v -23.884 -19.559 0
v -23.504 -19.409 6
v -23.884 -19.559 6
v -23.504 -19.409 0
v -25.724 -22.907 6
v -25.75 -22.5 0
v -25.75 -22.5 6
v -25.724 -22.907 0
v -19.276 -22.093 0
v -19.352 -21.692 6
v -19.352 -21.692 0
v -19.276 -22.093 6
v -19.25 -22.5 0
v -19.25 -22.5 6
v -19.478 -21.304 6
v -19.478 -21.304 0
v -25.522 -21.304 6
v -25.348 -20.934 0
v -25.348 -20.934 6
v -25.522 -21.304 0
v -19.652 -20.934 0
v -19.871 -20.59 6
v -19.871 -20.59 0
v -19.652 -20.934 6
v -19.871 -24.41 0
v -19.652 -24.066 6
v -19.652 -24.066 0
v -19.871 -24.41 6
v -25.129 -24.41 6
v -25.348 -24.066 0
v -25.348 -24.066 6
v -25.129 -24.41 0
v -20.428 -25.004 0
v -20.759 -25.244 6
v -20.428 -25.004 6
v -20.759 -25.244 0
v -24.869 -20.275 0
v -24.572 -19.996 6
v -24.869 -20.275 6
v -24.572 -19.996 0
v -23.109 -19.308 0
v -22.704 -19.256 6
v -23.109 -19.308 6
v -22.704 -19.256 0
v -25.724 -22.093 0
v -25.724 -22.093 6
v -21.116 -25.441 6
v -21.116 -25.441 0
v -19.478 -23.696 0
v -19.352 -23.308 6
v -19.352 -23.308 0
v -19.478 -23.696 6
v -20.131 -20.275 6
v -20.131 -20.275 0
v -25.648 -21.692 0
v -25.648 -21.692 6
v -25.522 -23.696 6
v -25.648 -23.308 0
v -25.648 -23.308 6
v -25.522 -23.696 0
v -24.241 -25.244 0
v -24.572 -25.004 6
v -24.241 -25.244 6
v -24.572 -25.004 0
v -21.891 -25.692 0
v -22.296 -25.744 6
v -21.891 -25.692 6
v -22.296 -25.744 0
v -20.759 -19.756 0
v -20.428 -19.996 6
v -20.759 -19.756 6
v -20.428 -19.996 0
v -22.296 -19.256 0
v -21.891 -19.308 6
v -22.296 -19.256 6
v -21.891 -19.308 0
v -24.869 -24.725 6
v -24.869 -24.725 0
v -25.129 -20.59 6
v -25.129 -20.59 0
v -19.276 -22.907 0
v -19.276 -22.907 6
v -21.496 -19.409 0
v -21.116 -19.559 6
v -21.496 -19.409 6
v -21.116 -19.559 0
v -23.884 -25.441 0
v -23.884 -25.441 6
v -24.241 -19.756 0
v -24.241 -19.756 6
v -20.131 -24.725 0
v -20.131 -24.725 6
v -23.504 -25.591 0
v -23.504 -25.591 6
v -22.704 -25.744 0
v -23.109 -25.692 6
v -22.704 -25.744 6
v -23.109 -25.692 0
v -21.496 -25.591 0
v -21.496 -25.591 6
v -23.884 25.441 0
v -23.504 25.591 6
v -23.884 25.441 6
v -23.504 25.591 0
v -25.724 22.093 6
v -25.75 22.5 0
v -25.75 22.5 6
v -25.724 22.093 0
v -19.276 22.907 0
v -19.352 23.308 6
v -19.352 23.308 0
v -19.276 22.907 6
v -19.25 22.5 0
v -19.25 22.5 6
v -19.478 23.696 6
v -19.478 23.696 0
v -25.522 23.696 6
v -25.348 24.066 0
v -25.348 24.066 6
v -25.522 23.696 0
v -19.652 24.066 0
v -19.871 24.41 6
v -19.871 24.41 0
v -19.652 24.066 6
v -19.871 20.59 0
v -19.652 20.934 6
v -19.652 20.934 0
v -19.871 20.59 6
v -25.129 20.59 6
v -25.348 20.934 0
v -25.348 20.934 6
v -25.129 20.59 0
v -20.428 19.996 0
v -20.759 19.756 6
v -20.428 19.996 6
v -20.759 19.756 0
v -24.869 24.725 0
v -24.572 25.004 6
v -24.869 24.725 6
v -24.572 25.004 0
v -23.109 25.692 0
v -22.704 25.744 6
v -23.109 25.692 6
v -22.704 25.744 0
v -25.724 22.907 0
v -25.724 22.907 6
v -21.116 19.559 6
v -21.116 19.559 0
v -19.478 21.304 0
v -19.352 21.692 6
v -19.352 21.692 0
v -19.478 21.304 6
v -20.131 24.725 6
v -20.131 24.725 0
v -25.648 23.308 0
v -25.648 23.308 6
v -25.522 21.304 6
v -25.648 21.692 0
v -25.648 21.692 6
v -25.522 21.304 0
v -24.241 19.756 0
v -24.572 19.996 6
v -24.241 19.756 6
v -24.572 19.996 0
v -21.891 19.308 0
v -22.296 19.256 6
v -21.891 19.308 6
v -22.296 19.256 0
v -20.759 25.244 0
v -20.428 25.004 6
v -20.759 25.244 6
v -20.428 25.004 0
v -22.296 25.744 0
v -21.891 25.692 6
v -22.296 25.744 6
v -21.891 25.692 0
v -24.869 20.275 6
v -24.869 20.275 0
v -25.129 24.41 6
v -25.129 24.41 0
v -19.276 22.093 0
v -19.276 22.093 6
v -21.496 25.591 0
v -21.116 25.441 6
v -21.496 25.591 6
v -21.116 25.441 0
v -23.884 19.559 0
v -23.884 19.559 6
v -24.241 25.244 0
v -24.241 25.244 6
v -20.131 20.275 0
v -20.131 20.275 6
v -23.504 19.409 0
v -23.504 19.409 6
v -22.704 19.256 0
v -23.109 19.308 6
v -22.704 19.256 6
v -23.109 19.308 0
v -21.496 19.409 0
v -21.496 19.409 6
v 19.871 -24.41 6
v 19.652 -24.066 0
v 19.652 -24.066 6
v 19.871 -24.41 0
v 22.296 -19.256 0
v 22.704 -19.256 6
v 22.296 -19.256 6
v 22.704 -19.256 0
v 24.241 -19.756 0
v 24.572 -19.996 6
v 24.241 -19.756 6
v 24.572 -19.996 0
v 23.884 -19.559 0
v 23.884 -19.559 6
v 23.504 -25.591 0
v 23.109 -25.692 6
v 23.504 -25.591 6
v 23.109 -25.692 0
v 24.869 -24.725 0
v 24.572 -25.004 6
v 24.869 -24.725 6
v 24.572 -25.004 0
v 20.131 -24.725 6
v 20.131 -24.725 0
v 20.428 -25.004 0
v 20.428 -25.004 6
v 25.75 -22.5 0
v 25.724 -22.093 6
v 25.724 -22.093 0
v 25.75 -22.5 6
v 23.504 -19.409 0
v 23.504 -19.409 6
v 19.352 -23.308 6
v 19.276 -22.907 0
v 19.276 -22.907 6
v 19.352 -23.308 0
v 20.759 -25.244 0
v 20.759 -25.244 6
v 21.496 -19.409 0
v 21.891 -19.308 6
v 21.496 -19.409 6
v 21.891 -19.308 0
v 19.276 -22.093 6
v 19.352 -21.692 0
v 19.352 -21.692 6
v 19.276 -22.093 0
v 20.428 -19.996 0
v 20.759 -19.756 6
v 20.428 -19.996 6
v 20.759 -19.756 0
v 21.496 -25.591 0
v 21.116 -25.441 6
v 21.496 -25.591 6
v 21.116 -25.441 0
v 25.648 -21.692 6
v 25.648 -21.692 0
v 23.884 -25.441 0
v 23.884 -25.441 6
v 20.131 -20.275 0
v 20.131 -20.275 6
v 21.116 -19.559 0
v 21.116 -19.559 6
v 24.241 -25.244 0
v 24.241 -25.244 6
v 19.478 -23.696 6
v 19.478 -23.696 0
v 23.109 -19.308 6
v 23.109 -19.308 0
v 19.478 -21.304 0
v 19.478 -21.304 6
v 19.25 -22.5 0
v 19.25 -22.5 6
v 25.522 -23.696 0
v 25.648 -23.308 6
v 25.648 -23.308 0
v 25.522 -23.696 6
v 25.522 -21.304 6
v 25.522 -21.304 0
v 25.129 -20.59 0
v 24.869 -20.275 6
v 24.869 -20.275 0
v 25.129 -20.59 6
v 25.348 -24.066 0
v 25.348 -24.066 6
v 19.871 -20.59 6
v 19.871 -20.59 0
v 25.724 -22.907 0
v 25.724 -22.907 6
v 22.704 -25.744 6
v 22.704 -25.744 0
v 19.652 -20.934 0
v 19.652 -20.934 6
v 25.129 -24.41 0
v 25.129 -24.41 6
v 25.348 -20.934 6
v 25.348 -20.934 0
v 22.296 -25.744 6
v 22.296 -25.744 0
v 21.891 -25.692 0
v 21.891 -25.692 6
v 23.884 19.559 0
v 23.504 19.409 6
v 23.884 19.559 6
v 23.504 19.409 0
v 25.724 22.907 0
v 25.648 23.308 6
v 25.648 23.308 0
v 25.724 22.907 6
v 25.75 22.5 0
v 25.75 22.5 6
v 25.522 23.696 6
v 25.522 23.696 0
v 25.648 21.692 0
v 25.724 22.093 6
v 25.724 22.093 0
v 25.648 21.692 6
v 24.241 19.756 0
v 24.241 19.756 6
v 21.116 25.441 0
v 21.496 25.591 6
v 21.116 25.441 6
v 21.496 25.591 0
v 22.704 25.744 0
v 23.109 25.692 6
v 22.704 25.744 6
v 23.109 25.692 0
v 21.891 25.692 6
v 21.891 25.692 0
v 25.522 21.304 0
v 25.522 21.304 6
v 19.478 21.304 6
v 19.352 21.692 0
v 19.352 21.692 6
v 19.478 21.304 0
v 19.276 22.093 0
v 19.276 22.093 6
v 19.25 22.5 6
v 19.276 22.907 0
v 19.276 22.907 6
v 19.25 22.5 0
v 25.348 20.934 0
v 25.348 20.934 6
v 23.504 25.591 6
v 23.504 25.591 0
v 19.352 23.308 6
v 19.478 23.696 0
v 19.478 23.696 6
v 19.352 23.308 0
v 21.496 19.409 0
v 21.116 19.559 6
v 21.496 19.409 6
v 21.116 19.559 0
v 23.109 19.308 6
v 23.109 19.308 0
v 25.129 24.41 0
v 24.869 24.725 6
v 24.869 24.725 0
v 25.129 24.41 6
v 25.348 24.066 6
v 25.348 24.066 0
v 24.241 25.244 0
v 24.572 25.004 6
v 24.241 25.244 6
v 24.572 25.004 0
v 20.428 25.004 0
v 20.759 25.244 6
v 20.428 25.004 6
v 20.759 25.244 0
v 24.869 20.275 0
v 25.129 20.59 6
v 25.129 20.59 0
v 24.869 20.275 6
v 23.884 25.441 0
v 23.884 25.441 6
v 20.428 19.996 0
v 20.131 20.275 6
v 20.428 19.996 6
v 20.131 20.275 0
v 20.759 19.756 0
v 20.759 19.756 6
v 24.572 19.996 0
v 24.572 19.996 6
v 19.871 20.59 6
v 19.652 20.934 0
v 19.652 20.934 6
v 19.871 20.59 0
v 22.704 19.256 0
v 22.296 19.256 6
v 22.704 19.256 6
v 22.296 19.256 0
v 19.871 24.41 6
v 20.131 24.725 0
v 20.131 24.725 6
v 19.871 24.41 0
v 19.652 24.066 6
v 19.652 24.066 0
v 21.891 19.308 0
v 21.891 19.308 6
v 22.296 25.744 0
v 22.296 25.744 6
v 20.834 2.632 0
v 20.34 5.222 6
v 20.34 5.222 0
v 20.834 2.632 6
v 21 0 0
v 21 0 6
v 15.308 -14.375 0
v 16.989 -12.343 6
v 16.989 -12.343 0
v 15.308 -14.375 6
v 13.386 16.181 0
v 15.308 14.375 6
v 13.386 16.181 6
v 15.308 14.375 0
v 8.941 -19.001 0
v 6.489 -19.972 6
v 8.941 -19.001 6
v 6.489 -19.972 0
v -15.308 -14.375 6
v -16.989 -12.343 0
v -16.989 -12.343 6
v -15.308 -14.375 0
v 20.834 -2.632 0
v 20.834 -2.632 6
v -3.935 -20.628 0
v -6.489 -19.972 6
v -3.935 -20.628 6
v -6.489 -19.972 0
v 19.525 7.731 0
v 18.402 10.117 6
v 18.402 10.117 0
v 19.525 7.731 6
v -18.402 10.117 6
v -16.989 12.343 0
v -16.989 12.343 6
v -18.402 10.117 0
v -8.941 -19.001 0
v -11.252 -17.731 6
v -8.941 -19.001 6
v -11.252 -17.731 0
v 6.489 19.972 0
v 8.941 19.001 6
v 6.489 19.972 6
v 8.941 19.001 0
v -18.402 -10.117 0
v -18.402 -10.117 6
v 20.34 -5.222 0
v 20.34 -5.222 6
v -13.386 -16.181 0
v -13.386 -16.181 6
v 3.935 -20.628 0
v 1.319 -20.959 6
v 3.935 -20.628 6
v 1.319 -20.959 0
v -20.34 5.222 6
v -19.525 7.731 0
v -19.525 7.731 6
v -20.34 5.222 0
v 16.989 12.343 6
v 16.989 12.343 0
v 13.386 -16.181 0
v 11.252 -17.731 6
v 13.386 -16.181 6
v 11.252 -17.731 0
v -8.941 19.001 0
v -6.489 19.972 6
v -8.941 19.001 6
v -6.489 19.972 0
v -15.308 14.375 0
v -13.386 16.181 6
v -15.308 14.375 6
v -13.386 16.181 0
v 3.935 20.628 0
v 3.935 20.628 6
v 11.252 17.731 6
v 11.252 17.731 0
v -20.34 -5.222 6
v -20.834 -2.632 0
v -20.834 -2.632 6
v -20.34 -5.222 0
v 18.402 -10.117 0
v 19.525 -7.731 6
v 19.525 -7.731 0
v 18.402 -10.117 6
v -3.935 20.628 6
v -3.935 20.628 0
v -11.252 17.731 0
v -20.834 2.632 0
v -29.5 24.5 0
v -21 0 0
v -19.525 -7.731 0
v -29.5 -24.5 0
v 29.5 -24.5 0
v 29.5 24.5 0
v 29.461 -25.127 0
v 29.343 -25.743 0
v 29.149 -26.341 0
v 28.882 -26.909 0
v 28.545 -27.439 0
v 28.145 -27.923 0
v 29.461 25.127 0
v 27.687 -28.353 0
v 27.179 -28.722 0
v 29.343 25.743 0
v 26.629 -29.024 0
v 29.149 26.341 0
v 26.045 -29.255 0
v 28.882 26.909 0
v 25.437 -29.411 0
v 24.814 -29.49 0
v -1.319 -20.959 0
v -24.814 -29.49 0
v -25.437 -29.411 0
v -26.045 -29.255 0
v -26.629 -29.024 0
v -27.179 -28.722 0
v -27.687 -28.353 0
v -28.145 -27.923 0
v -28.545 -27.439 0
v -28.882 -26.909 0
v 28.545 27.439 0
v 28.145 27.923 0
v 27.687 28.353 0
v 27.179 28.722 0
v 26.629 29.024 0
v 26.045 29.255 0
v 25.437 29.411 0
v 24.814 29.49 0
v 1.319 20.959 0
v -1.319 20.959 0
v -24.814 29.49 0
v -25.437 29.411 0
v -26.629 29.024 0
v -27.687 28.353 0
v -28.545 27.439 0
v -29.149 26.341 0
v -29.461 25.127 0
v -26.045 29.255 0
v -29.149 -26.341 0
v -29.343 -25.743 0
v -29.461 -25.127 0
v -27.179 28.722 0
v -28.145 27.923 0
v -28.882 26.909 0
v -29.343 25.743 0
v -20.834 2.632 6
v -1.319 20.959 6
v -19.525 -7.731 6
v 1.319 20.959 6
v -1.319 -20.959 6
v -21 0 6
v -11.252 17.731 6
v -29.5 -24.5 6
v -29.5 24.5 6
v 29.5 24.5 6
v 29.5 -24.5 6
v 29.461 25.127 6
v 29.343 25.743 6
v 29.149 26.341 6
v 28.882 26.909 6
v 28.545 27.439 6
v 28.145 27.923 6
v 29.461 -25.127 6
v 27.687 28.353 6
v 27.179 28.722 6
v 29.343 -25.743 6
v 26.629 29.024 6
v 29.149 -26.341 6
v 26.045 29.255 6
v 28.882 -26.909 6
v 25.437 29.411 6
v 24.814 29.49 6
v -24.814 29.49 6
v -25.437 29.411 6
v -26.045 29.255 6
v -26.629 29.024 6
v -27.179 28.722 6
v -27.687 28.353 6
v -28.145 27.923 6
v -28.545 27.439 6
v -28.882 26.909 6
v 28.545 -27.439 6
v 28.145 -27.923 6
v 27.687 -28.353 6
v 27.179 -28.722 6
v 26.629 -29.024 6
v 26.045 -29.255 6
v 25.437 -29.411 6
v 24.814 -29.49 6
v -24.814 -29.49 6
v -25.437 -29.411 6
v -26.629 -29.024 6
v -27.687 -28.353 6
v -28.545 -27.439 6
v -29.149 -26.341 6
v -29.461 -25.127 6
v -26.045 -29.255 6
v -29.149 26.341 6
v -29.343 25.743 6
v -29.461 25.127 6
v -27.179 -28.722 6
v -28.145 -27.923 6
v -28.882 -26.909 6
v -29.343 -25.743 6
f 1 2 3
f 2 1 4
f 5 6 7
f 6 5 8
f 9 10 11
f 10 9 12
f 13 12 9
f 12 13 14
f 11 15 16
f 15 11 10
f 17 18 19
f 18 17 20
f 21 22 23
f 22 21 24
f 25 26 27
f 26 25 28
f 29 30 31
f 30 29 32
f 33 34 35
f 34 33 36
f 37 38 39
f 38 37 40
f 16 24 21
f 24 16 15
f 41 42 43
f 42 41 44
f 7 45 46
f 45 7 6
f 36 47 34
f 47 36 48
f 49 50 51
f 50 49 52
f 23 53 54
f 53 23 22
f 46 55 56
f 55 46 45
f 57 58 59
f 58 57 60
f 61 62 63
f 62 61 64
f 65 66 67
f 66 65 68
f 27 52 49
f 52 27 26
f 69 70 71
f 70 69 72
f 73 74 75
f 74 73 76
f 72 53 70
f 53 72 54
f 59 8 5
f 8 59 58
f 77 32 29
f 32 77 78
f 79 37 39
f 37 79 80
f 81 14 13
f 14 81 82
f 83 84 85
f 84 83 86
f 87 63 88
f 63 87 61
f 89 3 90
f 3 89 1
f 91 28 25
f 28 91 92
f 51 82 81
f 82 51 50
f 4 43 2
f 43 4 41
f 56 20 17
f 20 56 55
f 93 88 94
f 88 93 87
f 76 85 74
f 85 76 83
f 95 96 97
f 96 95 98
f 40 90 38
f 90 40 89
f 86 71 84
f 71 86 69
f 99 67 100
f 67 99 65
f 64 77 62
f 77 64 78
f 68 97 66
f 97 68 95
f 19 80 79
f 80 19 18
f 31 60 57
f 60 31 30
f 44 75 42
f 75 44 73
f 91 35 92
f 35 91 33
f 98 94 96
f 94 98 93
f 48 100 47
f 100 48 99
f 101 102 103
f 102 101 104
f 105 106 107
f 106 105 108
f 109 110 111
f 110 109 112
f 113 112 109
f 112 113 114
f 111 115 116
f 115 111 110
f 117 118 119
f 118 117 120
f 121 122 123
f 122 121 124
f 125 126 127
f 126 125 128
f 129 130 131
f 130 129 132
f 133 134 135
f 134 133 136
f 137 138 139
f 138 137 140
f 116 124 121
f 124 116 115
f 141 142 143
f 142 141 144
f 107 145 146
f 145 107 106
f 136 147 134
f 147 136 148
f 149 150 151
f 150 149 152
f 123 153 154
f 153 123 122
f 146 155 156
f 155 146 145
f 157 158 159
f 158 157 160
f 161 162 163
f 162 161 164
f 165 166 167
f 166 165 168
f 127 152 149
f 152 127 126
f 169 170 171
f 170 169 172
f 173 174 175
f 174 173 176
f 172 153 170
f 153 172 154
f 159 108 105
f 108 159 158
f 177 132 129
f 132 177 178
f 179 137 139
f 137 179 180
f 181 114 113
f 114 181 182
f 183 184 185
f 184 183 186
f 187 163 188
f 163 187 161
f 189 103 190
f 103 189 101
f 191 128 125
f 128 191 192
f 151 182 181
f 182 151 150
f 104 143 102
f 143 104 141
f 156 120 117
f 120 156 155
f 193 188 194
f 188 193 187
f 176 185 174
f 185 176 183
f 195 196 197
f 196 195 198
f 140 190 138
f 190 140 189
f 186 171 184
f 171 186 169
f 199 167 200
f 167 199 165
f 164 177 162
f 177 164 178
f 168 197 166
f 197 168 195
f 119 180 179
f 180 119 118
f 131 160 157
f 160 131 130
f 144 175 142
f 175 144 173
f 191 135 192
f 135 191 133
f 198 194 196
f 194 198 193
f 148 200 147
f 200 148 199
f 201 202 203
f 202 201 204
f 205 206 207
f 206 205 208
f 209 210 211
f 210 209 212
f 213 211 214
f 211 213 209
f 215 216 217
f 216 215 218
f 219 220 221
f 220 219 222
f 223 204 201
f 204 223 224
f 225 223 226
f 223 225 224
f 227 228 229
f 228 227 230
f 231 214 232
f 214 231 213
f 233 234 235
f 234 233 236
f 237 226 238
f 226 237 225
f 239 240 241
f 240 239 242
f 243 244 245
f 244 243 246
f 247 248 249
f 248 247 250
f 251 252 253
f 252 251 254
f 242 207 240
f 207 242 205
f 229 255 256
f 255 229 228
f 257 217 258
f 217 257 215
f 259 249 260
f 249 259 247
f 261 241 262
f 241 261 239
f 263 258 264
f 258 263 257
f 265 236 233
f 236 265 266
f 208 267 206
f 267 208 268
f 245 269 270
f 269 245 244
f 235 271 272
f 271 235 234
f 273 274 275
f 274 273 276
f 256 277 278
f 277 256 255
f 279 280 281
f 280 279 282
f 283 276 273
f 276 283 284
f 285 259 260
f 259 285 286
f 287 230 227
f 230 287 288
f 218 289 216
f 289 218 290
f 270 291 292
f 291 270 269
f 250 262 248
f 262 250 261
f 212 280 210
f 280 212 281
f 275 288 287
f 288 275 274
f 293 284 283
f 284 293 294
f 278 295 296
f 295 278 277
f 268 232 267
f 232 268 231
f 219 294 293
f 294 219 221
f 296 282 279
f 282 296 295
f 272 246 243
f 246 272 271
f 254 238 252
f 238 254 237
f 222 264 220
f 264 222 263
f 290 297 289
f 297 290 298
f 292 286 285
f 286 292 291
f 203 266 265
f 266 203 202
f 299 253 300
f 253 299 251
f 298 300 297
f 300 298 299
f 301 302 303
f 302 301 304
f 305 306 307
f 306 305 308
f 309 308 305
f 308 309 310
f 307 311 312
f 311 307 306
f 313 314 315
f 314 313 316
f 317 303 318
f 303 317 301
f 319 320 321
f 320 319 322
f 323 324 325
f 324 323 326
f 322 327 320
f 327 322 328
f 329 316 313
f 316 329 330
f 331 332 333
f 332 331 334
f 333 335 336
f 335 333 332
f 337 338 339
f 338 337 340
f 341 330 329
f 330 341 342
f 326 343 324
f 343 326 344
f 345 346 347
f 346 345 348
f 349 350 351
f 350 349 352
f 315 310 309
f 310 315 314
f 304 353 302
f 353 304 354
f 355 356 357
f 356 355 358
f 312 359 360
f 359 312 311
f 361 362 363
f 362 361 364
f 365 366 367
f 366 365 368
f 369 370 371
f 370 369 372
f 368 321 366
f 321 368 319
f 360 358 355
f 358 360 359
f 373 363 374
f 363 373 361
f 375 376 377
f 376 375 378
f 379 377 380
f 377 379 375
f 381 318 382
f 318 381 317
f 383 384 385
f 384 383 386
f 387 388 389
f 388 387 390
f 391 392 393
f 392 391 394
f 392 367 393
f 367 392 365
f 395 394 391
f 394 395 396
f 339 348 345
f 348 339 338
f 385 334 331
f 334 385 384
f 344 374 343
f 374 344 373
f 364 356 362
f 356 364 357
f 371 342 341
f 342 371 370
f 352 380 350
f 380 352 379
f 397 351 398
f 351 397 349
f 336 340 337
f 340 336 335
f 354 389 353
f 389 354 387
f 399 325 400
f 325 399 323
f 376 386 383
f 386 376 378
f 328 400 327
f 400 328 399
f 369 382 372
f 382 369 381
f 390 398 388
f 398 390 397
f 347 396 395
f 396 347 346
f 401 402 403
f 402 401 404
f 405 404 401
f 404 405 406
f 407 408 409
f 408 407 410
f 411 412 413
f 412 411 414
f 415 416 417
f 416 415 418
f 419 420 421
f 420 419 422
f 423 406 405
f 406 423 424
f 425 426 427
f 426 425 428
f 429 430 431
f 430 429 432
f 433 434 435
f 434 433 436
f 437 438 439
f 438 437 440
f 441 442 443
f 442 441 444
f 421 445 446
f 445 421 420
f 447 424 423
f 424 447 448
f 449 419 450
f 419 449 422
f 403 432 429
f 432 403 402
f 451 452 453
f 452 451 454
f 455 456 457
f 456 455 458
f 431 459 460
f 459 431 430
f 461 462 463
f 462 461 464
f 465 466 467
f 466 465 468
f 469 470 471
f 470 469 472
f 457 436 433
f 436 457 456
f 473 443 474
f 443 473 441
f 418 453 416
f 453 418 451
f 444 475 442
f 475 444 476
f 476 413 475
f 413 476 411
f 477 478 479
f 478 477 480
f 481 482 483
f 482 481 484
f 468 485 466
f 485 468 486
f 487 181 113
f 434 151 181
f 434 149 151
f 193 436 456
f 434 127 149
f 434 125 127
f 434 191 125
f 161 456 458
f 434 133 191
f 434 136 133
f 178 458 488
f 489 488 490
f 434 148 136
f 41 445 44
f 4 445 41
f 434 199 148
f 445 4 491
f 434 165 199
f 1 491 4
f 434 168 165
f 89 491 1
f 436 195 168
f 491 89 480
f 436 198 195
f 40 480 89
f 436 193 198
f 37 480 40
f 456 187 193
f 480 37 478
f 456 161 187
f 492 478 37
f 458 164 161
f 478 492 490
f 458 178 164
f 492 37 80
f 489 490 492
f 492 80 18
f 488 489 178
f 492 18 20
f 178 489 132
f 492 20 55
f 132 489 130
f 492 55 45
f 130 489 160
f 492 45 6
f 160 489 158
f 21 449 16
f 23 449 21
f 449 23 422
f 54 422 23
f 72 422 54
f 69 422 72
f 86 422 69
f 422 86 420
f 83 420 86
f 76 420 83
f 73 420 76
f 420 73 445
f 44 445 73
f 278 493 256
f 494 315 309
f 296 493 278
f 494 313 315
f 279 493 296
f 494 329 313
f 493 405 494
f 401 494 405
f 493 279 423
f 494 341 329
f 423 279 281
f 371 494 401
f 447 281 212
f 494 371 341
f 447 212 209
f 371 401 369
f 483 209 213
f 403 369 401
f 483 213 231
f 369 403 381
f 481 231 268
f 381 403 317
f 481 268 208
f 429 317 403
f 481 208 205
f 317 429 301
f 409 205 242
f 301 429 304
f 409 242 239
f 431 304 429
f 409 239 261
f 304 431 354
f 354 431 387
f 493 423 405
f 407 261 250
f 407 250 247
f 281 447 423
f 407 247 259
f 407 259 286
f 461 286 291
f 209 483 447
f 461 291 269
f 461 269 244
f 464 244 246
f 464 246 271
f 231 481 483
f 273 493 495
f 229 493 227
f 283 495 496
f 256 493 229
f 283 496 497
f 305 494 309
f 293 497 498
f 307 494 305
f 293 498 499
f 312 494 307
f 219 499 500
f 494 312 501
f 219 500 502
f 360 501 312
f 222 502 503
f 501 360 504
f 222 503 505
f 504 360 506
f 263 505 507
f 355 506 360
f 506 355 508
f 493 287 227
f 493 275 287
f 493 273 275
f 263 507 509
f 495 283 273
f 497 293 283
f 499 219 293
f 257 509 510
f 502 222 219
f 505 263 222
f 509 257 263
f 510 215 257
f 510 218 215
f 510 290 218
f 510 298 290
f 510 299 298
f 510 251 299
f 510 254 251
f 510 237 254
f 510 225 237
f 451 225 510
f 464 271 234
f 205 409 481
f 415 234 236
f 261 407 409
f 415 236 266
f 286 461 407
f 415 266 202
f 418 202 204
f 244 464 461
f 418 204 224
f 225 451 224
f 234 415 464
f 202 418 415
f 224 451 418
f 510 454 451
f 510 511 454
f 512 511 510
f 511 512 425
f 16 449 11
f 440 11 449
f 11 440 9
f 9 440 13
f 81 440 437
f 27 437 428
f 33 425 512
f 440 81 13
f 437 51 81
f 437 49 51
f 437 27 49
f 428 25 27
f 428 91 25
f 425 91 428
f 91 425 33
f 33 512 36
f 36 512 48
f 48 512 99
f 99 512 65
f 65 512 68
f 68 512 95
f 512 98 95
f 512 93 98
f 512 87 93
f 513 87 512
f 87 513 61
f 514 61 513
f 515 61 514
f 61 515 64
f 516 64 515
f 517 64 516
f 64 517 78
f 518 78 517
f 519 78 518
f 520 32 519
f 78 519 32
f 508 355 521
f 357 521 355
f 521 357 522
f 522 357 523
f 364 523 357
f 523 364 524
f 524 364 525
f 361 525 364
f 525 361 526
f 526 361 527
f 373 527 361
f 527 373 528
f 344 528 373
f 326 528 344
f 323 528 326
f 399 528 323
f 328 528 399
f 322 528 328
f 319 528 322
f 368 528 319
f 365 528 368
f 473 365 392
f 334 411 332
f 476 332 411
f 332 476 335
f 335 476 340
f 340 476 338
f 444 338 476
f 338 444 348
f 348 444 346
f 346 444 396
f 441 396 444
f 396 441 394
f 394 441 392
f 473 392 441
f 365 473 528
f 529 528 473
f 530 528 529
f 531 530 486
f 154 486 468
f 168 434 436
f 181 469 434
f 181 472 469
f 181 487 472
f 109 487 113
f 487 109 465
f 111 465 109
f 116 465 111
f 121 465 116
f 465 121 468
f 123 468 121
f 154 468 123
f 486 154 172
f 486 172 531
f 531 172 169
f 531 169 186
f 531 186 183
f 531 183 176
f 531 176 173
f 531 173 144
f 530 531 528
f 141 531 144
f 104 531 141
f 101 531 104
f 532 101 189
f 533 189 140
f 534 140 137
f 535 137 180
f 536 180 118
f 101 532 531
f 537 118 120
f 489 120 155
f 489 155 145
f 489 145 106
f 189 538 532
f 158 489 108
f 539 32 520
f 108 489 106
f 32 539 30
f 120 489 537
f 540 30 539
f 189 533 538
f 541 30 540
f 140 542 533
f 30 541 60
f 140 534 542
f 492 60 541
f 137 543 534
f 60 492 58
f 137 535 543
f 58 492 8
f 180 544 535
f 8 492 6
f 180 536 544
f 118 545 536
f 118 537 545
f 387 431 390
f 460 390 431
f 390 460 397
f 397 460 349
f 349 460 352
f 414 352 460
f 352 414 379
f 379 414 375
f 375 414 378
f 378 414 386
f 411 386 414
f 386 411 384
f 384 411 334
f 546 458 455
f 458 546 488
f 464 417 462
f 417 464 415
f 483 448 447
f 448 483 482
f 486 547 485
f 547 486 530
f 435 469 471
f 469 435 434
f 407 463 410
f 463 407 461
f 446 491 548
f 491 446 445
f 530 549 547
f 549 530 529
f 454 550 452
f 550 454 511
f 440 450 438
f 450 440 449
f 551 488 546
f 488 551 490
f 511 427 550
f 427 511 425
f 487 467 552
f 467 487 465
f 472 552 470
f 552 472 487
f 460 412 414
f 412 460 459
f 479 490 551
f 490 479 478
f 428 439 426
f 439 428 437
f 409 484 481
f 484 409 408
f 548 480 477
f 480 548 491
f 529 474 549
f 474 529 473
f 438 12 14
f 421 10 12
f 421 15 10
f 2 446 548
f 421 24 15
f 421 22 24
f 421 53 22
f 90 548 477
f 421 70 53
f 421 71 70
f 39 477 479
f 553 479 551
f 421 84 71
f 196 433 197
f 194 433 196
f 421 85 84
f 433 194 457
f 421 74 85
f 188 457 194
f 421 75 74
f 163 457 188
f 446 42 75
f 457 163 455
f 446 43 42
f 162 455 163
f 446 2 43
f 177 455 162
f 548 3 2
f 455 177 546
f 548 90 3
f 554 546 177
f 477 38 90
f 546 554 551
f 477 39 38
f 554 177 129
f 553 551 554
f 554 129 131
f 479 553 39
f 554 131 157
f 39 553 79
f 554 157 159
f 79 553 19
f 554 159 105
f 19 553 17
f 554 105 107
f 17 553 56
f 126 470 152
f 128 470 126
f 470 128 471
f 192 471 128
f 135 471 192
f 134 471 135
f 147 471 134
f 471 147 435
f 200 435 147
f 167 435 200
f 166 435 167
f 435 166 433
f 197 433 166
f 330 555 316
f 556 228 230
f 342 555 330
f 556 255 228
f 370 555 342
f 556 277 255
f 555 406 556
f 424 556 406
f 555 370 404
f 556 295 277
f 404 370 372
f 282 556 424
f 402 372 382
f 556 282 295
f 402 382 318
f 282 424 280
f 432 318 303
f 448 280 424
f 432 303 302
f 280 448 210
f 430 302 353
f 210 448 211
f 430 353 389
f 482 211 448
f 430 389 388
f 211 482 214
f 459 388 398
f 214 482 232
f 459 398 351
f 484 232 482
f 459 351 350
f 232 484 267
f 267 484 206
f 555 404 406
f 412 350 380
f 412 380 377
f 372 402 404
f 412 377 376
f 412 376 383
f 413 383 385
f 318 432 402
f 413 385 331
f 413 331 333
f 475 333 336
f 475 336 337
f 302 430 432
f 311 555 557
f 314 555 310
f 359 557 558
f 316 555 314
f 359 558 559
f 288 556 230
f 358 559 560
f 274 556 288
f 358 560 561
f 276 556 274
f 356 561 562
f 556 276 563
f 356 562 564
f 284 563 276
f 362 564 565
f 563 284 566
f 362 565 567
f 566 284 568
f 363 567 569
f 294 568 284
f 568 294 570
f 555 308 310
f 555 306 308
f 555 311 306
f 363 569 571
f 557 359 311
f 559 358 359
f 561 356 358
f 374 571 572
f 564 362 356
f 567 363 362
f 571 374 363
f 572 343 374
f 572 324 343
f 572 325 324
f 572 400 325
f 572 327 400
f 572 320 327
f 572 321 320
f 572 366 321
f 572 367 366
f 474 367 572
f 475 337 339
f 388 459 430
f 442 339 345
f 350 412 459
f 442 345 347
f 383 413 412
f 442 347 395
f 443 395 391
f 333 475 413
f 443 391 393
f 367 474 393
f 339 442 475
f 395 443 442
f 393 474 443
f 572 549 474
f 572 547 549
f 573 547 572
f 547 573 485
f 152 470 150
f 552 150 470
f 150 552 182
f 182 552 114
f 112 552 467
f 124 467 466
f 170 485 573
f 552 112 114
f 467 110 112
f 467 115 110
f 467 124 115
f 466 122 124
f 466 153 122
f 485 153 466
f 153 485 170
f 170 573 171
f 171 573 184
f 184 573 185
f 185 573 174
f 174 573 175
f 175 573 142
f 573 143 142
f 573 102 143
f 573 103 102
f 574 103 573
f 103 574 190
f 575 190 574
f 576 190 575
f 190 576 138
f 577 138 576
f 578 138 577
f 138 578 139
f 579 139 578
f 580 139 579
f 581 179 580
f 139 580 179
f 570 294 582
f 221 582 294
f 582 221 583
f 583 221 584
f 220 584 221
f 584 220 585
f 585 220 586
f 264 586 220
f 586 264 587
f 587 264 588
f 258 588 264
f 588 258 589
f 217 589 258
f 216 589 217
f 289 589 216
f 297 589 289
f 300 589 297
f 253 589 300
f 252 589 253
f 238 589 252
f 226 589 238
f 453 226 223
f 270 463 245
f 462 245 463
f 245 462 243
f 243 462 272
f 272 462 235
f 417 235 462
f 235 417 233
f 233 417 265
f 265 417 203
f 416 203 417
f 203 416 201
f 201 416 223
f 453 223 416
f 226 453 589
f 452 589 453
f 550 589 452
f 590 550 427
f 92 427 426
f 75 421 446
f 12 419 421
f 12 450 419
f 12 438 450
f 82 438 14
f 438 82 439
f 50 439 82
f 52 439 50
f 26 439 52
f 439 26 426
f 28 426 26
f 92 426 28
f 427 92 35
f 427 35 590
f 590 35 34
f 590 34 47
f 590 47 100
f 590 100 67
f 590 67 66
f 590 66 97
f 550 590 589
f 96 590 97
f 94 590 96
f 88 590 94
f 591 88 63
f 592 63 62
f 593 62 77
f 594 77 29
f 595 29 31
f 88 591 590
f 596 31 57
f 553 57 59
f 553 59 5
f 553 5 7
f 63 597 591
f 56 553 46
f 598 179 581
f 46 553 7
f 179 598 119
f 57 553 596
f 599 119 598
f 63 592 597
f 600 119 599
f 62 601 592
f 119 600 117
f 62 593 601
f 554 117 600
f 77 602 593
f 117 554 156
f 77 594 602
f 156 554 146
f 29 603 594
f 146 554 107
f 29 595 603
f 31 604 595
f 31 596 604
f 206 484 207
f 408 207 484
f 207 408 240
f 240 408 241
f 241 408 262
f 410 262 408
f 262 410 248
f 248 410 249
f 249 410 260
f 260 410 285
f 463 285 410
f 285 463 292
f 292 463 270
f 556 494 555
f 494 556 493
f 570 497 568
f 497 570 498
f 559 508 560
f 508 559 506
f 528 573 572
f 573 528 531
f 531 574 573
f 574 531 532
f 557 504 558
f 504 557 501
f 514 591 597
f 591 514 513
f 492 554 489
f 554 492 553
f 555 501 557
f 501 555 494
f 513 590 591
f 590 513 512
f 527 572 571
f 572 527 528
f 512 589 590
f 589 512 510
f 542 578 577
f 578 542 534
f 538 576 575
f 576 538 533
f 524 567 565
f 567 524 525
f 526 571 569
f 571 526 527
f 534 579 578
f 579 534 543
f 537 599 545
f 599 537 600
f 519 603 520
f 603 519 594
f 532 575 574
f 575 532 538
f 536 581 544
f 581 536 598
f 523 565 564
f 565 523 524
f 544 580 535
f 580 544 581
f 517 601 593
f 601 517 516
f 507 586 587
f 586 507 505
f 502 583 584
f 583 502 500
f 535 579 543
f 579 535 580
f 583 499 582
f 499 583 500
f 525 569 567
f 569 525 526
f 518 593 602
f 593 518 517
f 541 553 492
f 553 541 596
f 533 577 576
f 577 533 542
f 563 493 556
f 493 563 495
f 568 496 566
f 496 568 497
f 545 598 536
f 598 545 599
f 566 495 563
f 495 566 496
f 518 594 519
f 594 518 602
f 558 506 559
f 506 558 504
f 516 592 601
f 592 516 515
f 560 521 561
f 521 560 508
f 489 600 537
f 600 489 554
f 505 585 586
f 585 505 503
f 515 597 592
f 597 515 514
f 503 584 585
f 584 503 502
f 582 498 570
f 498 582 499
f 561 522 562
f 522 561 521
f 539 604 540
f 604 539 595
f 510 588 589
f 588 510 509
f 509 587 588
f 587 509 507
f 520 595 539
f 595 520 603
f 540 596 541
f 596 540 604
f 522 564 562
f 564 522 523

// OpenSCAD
$fn = 50;

difference() {
	union() {
		hull() {
			translate(v = [-24.5, 24.5, 0]) {
				cylinder(h = 6, r = 5);
			}
			translate(v = [24.5, 24.5, 0]) {
				cylinder(h = 6, r = 5);
			}
			translate(v = [-24.5, -24.5, 0]) {
				cylinder(h = 6, r = 5);
			}
			translate(v = [24.5, -24.5, 0]) {
				cylinder(h = 6, r = 5);
			}
		}
	}
	union() {
		translate(v = [-22.5, -22.5, -100.0]) {
			cylinder(h = 200, r = 3.25);
		}
		translate(v = [-22.5, 22.5, -100.0]) {
			cylinder(h = 200, r = 3.25);
		}
		translate(v = [22.5, -22.5, -100.0]) {
			cylinder(h = 200, r = 3.25);
		}
		translate(v = [22.5, 22.5, -100.0]) {
			cylinder(h = 200, r = 3.25);
		}
		translate(v = [-22.5, -22.5, -100.0]) {
			cylinder(h = 200, r = 1.8);
		}
		translate(v = [-22.5, 22.5, -100.0]) {
			cylinder(h = 200, r = 1.8);
		}
		translate(v = [22.5, -22.5, -100.0]) {
			cylinder(h = 200, r = 1.8);
		}
		translate(v = [22.5, 22.5, -100.0]) {
			cylinder(h = 200, r = 1.8);
		}
		cylinder(h = 6, r = 21.0);
	}
}
